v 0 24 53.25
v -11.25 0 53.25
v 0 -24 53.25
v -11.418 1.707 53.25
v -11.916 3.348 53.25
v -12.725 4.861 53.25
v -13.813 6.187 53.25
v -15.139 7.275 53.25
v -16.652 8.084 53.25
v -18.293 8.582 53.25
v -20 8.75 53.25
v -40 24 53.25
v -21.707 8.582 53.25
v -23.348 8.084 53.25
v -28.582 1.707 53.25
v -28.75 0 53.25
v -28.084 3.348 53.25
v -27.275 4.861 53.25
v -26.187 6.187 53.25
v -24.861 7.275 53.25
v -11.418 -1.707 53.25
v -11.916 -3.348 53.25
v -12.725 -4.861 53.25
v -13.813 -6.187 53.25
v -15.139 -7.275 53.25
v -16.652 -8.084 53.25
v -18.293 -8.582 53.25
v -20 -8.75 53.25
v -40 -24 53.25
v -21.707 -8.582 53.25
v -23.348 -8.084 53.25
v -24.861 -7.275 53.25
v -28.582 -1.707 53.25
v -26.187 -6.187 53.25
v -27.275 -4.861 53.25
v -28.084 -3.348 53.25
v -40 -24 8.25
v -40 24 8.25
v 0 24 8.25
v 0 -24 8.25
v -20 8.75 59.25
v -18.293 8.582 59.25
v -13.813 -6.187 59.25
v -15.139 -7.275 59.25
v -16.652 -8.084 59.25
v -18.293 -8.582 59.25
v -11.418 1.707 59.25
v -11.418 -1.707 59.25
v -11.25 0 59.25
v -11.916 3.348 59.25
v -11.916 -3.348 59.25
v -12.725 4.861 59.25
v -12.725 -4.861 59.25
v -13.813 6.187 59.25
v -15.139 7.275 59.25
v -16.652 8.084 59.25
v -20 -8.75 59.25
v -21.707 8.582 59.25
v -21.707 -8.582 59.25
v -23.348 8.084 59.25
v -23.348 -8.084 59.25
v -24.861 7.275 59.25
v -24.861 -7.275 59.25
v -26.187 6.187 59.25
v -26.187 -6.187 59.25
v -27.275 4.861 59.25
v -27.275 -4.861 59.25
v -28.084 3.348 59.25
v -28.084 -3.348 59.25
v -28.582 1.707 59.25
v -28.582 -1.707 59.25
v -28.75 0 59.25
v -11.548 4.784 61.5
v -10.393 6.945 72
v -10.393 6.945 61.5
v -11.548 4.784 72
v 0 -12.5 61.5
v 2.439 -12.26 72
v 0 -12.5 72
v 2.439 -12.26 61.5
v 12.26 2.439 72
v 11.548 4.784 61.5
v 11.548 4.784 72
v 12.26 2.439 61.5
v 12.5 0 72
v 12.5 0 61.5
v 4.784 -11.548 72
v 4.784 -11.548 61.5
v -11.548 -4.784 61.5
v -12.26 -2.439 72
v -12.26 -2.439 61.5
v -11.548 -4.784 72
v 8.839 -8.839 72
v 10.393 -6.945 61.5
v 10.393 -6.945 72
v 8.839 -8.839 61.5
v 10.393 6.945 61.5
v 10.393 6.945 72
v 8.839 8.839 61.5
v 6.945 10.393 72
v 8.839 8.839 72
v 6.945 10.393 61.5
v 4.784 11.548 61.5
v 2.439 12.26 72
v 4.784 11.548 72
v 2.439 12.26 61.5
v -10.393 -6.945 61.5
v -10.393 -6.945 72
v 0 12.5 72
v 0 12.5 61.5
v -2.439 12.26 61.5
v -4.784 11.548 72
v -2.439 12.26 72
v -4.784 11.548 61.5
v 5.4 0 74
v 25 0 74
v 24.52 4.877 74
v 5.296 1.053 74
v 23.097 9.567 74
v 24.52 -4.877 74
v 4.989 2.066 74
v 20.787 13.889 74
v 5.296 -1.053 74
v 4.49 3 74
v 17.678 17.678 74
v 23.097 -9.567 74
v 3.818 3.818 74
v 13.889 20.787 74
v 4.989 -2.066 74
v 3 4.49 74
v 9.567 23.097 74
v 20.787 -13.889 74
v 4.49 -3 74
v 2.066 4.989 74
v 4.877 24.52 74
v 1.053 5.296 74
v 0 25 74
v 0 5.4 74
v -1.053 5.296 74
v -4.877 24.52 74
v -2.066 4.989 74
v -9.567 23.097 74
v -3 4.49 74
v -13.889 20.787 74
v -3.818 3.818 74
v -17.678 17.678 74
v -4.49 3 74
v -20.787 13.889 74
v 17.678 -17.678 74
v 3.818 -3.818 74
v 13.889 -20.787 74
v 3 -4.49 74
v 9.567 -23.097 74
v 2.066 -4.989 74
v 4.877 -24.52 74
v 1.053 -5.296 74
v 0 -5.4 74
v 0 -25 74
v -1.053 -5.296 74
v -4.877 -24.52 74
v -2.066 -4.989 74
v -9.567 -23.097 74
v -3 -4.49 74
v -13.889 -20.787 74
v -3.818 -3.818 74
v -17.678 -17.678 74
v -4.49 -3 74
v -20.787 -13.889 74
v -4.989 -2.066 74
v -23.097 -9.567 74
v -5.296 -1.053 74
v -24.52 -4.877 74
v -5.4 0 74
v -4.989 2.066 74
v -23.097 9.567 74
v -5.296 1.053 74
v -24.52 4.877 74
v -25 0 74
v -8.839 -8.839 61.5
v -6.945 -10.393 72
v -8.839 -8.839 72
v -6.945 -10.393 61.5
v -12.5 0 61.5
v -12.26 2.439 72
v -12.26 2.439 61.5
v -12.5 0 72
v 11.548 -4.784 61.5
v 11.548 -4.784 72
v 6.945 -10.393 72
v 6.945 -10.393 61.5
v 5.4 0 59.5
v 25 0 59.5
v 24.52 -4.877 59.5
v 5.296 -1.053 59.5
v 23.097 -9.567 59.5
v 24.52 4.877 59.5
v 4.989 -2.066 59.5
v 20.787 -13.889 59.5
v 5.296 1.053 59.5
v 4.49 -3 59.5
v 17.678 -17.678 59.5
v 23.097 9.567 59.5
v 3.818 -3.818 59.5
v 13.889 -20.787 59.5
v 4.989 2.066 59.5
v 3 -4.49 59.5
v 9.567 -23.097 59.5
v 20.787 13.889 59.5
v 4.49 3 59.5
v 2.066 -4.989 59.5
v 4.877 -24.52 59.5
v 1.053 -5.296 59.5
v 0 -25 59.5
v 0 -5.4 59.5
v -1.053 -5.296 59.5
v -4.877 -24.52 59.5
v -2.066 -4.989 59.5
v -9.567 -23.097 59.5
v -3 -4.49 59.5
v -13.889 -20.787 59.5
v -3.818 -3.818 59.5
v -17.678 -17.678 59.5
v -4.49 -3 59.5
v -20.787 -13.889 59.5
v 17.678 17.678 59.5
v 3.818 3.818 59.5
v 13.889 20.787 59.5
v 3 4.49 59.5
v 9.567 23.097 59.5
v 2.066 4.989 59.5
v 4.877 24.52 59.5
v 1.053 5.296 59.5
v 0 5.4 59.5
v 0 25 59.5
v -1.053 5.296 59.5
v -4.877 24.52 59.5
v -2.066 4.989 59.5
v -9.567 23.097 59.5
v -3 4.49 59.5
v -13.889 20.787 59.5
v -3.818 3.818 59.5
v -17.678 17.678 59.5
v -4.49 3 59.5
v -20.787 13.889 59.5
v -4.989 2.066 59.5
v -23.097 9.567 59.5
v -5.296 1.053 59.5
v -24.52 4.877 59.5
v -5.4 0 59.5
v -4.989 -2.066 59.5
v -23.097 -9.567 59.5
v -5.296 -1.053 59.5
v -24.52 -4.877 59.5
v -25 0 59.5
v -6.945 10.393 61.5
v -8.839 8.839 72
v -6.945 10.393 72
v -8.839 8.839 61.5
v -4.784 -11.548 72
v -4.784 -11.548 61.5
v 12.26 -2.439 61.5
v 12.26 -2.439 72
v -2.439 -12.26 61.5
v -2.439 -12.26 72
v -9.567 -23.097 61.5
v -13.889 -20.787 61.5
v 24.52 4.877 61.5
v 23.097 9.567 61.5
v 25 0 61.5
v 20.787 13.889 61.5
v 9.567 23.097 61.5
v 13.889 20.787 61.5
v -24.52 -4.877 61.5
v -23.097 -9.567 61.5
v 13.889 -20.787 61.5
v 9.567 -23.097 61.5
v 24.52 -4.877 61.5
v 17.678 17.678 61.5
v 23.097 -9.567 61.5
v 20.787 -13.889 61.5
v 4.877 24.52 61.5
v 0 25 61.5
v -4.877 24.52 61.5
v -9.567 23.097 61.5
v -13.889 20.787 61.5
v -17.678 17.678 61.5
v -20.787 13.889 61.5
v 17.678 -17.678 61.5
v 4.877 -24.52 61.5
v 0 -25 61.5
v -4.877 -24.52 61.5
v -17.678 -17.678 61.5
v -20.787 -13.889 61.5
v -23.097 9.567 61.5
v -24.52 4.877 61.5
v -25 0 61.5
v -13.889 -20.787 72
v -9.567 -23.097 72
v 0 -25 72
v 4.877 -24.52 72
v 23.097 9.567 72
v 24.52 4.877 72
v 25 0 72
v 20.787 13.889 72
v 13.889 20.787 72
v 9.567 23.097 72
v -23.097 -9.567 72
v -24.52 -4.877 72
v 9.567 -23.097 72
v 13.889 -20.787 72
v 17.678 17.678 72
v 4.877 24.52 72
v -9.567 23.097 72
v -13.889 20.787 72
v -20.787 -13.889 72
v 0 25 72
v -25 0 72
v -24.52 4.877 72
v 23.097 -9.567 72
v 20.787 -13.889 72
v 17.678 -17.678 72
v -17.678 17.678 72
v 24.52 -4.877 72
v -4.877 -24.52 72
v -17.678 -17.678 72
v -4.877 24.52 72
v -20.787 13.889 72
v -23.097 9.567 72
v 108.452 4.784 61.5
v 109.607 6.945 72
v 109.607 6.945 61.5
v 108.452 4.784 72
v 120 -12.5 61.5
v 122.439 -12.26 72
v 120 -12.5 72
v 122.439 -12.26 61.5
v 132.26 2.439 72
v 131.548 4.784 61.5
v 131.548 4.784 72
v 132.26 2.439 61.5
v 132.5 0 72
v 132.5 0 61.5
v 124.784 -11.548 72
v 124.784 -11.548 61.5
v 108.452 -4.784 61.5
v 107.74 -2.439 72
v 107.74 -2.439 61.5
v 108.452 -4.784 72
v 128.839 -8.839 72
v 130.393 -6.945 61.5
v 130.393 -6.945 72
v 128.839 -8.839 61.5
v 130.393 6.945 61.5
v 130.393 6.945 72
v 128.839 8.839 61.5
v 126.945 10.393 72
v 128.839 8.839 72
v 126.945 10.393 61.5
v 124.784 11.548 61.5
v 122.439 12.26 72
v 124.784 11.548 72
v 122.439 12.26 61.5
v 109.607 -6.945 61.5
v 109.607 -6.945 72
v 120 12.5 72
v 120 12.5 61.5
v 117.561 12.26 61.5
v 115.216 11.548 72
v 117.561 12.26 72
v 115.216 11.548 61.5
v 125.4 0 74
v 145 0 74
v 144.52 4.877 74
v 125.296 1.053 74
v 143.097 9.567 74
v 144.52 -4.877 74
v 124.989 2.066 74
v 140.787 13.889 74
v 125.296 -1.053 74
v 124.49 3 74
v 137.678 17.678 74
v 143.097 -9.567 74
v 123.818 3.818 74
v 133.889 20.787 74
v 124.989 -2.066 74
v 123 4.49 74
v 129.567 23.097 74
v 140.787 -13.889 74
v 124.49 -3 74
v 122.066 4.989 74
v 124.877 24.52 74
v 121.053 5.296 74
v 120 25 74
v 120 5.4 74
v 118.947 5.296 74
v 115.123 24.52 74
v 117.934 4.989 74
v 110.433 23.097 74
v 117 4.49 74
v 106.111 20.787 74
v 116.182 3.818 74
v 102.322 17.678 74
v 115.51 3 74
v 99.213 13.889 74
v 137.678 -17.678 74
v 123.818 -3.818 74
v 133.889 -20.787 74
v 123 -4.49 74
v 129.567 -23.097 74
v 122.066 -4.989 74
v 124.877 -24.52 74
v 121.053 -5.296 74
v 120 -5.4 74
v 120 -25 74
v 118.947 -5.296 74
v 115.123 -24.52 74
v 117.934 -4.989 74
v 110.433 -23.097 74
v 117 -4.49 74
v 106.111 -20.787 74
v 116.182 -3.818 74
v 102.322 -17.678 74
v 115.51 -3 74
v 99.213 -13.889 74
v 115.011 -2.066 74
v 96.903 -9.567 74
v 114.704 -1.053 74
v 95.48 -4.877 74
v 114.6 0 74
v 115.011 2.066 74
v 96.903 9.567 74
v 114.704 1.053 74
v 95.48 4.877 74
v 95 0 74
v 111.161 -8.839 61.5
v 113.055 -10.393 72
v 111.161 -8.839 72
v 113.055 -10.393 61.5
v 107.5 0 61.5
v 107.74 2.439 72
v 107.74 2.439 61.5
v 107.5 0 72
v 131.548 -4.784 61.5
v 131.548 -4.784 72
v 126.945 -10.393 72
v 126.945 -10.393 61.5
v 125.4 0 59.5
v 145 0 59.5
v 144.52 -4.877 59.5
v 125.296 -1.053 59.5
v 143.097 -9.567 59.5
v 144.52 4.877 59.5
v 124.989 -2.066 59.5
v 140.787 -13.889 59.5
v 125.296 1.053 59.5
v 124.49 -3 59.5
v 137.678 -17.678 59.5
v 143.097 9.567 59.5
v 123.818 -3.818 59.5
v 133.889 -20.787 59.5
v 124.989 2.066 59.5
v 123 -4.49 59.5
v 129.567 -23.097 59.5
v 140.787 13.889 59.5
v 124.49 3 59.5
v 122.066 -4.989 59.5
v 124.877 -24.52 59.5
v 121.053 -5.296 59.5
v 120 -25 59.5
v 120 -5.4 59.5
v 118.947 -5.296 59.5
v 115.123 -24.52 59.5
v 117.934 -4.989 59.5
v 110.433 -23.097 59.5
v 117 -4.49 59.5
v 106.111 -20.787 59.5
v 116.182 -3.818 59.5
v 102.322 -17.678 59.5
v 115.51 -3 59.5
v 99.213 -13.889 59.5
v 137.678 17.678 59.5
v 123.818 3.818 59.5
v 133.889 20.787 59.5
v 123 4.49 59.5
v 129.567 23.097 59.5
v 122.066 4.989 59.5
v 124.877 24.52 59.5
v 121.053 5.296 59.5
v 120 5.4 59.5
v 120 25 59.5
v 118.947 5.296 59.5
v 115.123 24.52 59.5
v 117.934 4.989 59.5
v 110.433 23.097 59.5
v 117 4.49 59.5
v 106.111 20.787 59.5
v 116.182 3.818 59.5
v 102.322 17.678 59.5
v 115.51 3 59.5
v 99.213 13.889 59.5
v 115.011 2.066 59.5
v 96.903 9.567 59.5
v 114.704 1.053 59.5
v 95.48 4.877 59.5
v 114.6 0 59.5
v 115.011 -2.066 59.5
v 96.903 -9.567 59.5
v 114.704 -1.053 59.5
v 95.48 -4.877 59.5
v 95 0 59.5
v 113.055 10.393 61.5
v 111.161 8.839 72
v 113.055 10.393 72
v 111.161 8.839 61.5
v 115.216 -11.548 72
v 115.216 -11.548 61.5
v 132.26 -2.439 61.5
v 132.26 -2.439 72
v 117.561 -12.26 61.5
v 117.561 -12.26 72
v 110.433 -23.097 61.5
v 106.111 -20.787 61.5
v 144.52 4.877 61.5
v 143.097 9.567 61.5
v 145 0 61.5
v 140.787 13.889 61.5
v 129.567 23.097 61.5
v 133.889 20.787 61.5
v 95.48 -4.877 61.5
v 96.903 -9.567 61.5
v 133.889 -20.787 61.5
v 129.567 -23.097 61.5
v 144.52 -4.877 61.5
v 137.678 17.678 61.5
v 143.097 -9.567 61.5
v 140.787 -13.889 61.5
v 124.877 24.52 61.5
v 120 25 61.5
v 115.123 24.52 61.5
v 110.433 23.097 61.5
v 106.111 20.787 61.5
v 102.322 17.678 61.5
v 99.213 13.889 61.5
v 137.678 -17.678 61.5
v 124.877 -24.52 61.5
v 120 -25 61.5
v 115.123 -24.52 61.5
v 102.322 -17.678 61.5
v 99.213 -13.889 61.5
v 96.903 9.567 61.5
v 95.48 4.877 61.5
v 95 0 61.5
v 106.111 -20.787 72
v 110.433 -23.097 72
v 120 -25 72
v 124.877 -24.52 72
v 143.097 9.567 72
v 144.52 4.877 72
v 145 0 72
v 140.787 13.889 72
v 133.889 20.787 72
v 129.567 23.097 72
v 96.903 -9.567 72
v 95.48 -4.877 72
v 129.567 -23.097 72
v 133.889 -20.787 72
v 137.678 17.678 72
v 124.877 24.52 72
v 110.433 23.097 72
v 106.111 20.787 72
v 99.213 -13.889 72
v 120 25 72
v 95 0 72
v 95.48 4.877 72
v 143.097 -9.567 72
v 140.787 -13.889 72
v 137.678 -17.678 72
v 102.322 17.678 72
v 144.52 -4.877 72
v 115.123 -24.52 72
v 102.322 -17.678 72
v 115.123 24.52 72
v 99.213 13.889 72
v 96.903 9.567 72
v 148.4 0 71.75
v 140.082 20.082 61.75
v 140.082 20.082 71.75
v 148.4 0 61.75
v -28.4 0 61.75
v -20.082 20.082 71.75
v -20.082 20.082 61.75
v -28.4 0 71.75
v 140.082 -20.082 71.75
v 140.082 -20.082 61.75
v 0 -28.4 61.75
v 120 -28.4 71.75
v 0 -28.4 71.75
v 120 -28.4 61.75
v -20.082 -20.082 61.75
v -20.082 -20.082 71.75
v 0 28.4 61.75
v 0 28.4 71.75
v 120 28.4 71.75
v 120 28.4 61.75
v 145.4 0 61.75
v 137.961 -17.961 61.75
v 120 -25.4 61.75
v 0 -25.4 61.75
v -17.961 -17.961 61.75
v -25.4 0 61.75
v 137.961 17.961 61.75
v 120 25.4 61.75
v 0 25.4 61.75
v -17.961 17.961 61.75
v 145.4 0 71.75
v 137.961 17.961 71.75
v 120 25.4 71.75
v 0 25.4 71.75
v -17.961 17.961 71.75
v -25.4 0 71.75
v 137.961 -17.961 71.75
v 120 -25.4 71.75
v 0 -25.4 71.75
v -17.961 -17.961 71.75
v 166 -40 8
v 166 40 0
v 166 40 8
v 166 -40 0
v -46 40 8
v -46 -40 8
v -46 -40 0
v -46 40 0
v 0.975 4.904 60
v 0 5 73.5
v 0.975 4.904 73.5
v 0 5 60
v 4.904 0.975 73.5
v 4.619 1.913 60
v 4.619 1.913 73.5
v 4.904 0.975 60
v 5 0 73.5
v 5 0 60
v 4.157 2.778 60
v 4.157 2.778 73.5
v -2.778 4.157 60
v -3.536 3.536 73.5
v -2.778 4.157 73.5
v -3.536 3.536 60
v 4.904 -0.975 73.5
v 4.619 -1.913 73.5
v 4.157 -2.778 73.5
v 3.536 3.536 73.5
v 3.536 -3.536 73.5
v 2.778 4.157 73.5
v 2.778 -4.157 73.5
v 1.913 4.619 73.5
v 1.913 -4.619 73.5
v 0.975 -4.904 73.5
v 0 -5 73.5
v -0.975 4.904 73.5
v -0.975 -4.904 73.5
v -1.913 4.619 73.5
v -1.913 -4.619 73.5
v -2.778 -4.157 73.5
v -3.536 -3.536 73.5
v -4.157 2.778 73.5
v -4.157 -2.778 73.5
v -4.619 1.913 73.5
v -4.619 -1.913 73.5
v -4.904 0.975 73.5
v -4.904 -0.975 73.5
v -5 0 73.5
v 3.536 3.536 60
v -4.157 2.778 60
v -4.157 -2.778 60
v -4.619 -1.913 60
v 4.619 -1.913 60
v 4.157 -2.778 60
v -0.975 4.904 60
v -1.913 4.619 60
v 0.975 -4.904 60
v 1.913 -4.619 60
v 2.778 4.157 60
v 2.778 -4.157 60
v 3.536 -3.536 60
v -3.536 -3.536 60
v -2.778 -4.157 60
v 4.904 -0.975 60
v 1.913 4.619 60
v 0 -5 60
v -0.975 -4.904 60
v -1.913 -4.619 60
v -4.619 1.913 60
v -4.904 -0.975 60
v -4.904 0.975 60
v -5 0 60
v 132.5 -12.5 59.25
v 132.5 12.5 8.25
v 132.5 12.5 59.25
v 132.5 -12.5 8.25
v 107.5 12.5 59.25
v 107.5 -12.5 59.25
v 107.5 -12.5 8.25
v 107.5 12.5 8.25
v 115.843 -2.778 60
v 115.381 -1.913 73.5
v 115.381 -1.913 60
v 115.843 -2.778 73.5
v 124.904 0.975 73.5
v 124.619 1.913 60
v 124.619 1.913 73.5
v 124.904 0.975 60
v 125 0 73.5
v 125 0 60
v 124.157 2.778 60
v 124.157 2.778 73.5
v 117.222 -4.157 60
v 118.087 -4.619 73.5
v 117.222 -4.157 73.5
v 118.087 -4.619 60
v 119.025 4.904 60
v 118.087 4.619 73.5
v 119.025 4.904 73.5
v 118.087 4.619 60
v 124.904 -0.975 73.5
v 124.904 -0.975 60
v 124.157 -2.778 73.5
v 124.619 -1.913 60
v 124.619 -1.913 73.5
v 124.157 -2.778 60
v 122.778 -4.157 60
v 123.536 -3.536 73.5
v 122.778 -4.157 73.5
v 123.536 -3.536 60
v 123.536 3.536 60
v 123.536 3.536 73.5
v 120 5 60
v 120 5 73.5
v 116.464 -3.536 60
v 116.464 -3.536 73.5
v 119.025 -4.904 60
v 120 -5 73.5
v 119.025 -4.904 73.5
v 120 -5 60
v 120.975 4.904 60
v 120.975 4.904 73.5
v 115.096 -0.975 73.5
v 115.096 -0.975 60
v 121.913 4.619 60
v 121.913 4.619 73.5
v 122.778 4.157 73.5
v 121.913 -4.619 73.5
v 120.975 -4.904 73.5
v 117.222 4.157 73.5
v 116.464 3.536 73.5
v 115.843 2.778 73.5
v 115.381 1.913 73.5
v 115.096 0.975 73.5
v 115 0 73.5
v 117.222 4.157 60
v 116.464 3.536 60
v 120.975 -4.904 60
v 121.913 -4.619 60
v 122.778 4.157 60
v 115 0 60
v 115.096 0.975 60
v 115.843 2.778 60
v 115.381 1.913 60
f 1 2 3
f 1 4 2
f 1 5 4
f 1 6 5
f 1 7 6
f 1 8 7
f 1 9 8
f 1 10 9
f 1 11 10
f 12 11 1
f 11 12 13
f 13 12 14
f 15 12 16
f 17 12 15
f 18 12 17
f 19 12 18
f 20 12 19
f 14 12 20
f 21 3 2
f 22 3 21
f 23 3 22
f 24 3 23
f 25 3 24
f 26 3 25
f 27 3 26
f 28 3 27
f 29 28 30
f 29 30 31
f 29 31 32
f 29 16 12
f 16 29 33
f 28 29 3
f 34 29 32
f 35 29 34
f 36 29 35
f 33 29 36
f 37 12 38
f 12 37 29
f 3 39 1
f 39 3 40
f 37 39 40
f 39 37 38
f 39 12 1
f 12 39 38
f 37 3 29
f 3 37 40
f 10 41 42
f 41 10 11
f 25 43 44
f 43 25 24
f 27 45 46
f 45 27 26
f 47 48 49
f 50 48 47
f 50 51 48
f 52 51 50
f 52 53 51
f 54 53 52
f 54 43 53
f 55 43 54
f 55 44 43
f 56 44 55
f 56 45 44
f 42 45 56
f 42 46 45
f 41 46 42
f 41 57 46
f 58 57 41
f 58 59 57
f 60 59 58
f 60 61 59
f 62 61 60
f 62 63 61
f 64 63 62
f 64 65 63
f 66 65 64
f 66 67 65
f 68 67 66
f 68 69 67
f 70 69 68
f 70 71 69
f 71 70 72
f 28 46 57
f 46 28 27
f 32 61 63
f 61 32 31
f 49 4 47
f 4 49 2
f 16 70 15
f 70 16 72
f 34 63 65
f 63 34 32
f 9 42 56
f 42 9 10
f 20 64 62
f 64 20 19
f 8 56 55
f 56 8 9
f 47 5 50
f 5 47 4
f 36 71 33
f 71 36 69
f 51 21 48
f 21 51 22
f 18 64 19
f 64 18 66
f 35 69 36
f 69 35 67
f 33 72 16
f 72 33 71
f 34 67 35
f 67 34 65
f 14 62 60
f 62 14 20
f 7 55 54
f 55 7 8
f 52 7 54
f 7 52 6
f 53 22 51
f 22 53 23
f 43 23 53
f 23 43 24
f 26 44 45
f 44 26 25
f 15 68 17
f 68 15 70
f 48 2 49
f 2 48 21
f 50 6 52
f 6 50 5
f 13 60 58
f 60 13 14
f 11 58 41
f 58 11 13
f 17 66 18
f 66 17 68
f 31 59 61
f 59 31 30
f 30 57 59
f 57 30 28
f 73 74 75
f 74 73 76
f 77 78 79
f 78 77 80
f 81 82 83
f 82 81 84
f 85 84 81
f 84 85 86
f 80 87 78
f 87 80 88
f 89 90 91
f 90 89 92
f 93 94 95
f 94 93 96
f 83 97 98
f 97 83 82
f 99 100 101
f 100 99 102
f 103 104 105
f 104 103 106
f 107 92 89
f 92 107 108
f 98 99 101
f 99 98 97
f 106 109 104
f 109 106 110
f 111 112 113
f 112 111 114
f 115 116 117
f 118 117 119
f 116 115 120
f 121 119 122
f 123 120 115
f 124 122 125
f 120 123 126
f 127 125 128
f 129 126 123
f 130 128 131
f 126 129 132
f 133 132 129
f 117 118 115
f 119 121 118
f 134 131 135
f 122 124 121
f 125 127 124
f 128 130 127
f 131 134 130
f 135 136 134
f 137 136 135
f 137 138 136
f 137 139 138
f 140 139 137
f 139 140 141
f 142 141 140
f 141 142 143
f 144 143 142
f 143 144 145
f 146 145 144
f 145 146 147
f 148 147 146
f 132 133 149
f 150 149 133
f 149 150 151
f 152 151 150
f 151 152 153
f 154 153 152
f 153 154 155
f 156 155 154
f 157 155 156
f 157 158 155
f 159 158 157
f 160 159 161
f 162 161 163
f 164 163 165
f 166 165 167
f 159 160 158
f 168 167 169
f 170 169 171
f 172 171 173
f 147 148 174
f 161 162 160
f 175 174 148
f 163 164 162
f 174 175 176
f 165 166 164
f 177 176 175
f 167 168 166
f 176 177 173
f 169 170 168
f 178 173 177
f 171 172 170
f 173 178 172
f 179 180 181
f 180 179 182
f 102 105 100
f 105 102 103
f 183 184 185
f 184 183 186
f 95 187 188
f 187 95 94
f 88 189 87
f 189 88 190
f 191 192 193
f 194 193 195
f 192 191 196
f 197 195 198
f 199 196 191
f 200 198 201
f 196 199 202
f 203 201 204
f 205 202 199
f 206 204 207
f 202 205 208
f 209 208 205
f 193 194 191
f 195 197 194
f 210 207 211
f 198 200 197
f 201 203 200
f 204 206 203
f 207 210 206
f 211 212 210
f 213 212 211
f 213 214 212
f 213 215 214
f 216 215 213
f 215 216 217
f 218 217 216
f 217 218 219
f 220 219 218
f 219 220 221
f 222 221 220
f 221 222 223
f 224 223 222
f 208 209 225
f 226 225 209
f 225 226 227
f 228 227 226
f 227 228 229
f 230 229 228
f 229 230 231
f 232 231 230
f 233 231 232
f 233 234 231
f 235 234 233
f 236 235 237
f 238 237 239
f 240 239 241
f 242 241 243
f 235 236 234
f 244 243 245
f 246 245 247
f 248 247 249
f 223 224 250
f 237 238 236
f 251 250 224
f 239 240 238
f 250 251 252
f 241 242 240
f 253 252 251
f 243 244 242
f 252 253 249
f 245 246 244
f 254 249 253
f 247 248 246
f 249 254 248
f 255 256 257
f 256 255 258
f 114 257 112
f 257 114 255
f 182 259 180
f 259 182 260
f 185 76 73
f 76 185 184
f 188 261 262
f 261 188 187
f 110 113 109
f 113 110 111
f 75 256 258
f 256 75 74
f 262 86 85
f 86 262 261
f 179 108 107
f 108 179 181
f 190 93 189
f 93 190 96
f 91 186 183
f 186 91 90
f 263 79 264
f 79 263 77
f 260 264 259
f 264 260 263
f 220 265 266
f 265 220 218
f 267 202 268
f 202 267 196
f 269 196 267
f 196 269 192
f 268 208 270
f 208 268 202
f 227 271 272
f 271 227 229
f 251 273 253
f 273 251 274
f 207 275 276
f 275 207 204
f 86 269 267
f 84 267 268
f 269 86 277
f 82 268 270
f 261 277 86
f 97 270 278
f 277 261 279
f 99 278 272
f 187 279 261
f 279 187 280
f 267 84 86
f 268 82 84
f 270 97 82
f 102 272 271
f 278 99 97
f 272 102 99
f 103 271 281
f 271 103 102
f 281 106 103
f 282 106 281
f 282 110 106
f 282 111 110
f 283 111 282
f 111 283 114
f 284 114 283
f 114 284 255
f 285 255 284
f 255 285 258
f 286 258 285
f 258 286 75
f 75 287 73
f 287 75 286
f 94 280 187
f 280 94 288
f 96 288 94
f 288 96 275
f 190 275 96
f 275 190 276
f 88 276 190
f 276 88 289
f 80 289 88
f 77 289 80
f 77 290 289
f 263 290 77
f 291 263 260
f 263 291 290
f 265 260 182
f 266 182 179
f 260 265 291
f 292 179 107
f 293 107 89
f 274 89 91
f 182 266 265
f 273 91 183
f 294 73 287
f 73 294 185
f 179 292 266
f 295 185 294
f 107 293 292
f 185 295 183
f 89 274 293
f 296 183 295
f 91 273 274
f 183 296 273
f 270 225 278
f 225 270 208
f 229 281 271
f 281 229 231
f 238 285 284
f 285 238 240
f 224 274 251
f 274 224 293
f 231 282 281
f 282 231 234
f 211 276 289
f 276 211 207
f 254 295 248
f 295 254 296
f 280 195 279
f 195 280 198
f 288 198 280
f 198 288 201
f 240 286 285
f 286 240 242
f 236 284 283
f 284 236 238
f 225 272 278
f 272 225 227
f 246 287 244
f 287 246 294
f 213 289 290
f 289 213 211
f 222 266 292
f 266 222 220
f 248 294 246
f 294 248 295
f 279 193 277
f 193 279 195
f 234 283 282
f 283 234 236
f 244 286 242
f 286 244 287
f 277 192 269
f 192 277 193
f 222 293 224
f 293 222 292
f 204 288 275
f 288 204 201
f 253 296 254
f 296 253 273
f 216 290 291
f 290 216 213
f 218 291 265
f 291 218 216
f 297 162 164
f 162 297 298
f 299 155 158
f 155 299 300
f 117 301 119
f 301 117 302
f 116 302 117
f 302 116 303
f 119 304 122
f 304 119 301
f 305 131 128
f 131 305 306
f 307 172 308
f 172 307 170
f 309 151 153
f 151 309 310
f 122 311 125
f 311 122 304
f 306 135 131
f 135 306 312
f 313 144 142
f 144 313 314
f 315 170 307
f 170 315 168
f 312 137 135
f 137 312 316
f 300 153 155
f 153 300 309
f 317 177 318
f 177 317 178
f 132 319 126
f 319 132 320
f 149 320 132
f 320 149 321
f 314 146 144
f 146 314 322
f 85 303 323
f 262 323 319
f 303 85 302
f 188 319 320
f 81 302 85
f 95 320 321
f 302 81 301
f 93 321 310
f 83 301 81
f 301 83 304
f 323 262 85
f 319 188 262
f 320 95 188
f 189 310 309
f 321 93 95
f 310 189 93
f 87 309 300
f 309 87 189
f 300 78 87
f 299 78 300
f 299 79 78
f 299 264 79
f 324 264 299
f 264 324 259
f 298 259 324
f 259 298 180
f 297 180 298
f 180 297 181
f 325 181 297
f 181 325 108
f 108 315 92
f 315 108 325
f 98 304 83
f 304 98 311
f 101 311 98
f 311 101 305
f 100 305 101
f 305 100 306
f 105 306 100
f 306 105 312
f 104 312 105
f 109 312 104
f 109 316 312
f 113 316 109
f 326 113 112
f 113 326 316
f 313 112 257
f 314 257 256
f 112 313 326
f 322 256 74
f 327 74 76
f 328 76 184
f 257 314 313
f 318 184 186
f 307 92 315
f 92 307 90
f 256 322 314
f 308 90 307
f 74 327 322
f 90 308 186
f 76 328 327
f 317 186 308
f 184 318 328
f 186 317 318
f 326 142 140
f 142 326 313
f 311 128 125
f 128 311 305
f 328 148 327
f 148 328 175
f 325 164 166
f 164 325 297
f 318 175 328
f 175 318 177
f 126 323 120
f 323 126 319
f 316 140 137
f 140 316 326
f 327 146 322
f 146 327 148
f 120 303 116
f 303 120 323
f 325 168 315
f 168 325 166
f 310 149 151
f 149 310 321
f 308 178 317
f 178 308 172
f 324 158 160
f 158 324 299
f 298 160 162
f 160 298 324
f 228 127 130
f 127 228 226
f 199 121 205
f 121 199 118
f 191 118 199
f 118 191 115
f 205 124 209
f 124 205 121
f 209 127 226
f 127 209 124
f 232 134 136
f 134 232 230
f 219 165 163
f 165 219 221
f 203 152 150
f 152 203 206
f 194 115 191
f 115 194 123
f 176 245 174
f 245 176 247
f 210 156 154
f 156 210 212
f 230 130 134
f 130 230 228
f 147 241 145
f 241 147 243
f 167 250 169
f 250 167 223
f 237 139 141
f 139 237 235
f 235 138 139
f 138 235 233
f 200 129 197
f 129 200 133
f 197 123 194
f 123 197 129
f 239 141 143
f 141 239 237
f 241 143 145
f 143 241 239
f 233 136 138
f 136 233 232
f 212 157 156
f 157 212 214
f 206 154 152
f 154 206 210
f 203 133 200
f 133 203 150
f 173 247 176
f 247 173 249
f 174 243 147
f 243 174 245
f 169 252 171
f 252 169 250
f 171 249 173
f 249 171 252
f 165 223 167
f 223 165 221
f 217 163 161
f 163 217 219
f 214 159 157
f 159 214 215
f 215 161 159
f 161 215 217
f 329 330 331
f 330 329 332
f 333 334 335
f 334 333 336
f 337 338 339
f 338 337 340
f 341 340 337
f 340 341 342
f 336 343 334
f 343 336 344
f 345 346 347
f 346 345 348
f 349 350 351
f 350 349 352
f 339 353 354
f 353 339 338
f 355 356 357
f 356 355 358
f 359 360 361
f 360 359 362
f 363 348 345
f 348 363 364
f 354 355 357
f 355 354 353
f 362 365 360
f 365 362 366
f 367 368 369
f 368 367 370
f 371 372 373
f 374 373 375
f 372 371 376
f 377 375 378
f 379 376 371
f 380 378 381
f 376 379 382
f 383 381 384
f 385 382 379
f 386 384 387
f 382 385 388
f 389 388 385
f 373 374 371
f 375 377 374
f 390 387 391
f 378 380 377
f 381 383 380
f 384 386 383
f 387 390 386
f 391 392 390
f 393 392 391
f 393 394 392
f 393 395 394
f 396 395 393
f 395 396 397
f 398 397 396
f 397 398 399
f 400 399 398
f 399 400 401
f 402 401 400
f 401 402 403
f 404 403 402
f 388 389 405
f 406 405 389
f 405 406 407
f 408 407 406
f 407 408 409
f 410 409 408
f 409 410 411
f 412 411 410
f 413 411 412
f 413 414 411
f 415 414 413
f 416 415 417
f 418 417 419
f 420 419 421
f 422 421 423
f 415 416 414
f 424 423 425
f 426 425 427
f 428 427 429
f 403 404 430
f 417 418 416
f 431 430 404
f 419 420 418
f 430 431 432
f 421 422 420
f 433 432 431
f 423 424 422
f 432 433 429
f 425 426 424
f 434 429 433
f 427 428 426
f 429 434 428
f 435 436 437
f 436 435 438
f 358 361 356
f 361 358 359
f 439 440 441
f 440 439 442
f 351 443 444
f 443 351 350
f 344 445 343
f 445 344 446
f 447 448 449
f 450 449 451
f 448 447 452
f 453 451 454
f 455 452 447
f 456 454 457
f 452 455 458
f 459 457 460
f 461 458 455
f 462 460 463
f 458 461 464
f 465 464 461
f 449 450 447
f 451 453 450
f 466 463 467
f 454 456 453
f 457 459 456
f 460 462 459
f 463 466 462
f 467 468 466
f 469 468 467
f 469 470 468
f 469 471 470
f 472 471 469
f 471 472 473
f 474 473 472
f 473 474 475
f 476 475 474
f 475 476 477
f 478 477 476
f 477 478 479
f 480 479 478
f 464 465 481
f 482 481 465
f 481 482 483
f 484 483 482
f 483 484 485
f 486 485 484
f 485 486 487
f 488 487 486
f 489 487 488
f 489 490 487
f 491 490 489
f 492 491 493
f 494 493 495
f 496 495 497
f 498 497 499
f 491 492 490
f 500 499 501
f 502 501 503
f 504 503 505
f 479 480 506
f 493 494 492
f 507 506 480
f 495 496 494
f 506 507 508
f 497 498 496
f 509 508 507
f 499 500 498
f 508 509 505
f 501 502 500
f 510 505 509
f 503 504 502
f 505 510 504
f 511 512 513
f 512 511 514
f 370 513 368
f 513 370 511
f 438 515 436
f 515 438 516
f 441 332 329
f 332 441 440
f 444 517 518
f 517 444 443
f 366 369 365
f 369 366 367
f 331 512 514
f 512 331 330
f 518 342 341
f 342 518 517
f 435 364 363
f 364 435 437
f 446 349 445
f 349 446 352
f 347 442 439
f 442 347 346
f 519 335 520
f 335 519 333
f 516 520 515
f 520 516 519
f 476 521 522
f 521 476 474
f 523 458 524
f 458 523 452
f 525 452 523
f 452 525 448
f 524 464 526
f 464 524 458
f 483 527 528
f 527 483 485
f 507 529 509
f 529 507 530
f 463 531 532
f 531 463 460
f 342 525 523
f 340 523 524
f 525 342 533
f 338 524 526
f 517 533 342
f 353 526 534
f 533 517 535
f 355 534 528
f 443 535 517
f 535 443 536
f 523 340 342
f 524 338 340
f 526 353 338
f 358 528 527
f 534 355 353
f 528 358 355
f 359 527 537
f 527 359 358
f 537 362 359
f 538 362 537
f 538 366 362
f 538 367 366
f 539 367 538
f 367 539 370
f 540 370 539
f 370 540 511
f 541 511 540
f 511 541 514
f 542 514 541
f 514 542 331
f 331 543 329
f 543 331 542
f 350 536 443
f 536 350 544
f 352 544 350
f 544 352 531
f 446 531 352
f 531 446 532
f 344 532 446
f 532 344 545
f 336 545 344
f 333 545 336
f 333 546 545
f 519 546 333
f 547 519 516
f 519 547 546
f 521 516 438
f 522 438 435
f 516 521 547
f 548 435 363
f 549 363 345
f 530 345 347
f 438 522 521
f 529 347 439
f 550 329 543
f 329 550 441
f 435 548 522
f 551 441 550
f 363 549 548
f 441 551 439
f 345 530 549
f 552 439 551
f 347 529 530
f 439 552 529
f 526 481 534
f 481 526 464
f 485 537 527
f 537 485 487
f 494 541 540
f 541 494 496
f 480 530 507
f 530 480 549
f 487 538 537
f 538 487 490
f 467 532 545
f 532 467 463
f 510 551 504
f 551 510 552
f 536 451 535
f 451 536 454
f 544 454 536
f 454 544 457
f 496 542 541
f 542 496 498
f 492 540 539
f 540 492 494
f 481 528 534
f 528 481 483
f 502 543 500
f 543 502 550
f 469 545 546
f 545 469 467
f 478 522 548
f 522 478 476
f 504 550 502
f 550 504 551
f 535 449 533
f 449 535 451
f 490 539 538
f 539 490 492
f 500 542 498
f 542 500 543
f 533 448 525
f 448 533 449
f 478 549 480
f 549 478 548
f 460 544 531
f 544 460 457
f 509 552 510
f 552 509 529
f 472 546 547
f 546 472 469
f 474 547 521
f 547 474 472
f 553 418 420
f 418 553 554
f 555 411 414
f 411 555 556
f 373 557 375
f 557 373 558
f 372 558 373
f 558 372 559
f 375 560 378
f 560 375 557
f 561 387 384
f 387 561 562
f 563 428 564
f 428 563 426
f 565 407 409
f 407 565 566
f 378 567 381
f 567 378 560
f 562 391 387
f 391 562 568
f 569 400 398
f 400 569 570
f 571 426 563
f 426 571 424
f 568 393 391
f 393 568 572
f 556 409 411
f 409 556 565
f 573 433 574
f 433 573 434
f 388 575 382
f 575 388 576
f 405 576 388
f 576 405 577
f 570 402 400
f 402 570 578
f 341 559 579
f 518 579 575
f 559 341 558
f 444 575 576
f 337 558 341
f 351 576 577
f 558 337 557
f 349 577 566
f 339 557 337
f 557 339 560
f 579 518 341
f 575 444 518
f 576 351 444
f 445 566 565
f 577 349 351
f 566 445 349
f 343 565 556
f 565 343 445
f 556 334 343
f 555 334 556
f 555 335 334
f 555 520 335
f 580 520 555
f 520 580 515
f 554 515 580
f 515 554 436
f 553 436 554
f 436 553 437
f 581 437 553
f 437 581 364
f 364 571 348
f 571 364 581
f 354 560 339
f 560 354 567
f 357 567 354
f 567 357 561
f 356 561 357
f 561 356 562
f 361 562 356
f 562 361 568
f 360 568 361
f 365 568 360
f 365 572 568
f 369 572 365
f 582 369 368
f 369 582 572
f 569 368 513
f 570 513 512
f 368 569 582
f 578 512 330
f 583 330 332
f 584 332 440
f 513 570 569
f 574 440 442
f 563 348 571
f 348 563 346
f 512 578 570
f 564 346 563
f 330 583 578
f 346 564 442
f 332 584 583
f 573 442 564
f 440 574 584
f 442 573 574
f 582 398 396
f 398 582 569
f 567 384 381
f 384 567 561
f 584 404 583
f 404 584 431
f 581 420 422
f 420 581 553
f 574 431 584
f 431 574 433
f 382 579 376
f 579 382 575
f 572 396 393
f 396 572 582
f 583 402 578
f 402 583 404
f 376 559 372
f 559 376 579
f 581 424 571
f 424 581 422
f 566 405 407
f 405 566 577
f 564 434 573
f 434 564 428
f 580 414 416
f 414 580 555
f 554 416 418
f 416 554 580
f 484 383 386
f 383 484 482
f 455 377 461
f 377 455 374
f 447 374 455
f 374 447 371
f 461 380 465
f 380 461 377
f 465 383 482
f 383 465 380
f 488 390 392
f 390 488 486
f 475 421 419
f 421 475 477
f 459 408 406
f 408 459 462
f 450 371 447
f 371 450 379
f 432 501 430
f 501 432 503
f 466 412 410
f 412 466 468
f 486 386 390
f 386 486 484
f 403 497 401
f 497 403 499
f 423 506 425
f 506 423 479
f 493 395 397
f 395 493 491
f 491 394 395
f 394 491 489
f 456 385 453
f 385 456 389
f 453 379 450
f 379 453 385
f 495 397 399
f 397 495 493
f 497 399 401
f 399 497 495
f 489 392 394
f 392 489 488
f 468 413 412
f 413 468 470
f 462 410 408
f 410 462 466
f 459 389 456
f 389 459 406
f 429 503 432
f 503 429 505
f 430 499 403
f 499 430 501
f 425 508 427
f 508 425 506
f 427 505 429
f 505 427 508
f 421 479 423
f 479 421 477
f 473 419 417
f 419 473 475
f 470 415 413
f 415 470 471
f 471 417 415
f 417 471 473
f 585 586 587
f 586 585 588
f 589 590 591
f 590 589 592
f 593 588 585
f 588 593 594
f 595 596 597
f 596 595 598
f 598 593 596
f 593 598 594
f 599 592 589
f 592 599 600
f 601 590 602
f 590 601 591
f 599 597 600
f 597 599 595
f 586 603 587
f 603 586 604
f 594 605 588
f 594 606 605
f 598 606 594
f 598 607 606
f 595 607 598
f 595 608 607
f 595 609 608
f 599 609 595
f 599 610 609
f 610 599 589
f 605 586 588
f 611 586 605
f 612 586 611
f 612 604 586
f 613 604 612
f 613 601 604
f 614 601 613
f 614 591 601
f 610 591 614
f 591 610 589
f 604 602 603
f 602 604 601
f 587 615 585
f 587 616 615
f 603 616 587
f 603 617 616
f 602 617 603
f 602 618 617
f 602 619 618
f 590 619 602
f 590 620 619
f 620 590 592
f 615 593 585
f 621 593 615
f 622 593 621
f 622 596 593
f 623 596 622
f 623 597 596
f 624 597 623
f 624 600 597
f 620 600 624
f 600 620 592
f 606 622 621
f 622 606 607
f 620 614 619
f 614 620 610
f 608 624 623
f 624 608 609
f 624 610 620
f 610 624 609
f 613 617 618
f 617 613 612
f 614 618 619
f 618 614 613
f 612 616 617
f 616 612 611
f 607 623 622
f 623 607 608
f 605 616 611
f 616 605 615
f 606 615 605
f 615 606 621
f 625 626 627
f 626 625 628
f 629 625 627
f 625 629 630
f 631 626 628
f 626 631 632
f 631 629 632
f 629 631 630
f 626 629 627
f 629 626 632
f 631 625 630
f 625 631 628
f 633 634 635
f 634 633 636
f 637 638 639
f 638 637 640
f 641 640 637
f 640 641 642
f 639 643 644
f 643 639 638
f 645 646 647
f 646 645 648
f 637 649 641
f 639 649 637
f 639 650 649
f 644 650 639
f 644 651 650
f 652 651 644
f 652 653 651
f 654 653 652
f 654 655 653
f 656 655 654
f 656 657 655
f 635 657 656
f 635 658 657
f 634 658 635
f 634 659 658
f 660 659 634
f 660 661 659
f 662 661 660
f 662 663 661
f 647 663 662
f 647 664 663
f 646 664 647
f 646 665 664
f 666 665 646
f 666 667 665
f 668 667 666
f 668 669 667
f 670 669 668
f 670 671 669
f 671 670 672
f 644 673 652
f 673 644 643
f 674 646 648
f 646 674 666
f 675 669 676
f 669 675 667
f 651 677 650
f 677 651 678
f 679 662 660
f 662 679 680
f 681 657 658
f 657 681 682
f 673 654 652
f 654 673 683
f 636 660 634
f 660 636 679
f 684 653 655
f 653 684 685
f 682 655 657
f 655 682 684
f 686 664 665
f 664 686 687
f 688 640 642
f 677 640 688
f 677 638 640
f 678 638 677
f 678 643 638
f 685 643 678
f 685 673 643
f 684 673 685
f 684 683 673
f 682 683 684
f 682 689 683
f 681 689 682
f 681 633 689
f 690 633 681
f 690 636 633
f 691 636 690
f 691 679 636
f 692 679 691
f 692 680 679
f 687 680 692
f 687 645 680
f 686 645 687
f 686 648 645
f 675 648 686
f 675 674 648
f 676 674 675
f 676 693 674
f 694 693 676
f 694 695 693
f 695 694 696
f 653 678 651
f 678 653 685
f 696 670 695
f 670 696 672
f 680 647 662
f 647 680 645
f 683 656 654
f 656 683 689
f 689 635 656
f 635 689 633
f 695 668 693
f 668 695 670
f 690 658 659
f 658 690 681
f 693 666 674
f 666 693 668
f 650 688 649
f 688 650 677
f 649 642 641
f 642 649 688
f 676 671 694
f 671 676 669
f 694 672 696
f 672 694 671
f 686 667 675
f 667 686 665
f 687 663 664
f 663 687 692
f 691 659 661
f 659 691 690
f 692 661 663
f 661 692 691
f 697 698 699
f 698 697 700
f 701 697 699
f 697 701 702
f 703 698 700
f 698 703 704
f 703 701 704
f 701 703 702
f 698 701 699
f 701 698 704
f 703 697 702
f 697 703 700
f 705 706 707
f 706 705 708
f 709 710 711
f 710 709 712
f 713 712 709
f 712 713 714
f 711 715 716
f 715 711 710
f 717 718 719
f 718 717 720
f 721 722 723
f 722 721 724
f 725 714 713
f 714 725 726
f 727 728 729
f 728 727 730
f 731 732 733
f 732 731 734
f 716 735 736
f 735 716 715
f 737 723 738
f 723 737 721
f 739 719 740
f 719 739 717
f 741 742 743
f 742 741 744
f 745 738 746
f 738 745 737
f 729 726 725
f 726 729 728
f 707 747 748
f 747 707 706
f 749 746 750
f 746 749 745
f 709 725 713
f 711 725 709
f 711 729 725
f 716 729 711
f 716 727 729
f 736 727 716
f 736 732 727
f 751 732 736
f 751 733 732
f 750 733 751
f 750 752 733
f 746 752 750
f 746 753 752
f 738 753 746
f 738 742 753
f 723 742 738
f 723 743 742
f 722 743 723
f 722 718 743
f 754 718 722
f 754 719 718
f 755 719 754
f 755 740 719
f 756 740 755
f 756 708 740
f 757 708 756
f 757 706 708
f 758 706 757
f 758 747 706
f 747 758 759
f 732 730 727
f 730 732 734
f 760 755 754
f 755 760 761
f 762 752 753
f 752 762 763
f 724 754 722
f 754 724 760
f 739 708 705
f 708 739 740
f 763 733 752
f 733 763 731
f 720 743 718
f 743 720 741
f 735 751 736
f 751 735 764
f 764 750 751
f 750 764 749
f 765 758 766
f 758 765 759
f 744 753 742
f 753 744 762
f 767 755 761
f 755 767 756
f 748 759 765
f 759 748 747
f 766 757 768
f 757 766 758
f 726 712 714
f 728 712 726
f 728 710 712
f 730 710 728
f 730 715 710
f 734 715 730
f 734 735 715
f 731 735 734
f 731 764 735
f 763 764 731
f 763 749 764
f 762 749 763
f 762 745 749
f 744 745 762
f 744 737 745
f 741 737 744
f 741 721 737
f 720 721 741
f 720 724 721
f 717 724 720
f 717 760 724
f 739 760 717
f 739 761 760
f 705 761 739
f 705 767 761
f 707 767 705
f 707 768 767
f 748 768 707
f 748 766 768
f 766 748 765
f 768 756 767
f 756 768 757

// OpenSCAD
$fn = 32;

// ------------------------------------------------------------------------
// Motor belt drive: span 120 mm, pulleys d50, belt 10 mm wide
// Every part is its own module, assembly() places every instance.
// ------------------------------------------------------------------------

// --- part 1 ---
module base_plate() {
  difference() {
    translate([-106, -40, 0]) cube([212, 80, 8]);
  }
}

// --- part 2 ---
module motor() {
  union() {
    translate([-22.5, -24, 0]) cube([45, 48, 40]);
    translate([25.5, 0, 20]) rotate([0, 90, 0]) cylinder(h = 6, d = 17.5, center = true);
  }
}

// --- part 3 ---
module drive_shaft() {
  translate([0, 0, -6.75]) cylinder(h = 13.5, d = 10);
}

// --- part 4 ---
module pulley_drive() {
  difference() {
    union() {
      cylinder(h = 14.5, d = 25);
      cylinder(h = 2, d = 50);
      translate([0, 0, 12.5]) cylinder(h = 2, d = 50);
    }
    translate([0, 0, -1]) cylinder(h = 16.5, d = 10.8);
  }
}

// --- part 5 ---
module idler_post() {
  translate([-12.5, -12.5, 0]) cube([25, 25, 51]);
}

// --- part 6 ---
module driven_shaft() {
  translate([0, 0, -6.75]) cylinder(h = 13.5, d = 10);
}

// --- part 7 ---
module pulley_driven() {
  difference() {
    union() {
      cylinder(h = 14.5, d = 25);
      cylinder(h = 2, d = 50);
      translate([0, 0, 12.5]) cylinder(h = 2, d = 50);
    }
    translate([0, 0, -1]) cylinder(h = 16.5, d = 10.8);
  }
}

// --- part 8 ---
module drive_belt() {
  difference() {
    linear_extrude(height = 10) polygon(points = concat([for (a = [90 : 45 : 270]) [28.4 * cos(a), 28.4 * sin(a)]], [for (a = [270 : 45 : 450]) [120 + 28.4 * cos(a), 28.4 * sin(a)]]));
    translate([0, 0, -1]) linear_extrude(height = 12) polygon(points = concat([for (a = [90 : 45 : 270]) [25.4 * cos(a), 25.4 * sin(a)]], [for (a = [270 : 45 : 450]) [120 + 25.4 * cos(a), 25.4 * sin(a)]]));
  }
}

// --- assembly ---
module assembly() {
  color([0.80, 0.24, 0.20]) translate([60, 0, 0]) rotate([0, 0, 0]) base_plate();
  color([0.20, 0.45, 0.75]) translate([0, 0, 30.75]) rotate([0, 270, 0]) motor();
  color([0.25, 0.62, 0.32]) translate([0, 0, 66.75]) rotate([0, 0, 0]) drive_shaft();
  color([0.92, 0.70, 0.18]) translate([0, 0, 59.5]) rotate([0, 0, 0]) pulley_drive();
  color([0.58, 0.35, 0.70]) translate([120, 0, 8.25]) rotate([0, 0, 0]) idler_post();
  color([0.16, 0.66, 0.66]) translate([120, 0, 66.75]) rotate([0, 0, 0]) driven_shaft();
  color([0.85, 0.48, 0.18]) translate([120, 0, 59.5]) rotate([0, 0, 0]) pulley_driven();
  color([0.55, 0.60, 0.65]) translate([0, 0, 61.75]) rotate([0, 0, 0]) drive_belt();
}

assembly();
